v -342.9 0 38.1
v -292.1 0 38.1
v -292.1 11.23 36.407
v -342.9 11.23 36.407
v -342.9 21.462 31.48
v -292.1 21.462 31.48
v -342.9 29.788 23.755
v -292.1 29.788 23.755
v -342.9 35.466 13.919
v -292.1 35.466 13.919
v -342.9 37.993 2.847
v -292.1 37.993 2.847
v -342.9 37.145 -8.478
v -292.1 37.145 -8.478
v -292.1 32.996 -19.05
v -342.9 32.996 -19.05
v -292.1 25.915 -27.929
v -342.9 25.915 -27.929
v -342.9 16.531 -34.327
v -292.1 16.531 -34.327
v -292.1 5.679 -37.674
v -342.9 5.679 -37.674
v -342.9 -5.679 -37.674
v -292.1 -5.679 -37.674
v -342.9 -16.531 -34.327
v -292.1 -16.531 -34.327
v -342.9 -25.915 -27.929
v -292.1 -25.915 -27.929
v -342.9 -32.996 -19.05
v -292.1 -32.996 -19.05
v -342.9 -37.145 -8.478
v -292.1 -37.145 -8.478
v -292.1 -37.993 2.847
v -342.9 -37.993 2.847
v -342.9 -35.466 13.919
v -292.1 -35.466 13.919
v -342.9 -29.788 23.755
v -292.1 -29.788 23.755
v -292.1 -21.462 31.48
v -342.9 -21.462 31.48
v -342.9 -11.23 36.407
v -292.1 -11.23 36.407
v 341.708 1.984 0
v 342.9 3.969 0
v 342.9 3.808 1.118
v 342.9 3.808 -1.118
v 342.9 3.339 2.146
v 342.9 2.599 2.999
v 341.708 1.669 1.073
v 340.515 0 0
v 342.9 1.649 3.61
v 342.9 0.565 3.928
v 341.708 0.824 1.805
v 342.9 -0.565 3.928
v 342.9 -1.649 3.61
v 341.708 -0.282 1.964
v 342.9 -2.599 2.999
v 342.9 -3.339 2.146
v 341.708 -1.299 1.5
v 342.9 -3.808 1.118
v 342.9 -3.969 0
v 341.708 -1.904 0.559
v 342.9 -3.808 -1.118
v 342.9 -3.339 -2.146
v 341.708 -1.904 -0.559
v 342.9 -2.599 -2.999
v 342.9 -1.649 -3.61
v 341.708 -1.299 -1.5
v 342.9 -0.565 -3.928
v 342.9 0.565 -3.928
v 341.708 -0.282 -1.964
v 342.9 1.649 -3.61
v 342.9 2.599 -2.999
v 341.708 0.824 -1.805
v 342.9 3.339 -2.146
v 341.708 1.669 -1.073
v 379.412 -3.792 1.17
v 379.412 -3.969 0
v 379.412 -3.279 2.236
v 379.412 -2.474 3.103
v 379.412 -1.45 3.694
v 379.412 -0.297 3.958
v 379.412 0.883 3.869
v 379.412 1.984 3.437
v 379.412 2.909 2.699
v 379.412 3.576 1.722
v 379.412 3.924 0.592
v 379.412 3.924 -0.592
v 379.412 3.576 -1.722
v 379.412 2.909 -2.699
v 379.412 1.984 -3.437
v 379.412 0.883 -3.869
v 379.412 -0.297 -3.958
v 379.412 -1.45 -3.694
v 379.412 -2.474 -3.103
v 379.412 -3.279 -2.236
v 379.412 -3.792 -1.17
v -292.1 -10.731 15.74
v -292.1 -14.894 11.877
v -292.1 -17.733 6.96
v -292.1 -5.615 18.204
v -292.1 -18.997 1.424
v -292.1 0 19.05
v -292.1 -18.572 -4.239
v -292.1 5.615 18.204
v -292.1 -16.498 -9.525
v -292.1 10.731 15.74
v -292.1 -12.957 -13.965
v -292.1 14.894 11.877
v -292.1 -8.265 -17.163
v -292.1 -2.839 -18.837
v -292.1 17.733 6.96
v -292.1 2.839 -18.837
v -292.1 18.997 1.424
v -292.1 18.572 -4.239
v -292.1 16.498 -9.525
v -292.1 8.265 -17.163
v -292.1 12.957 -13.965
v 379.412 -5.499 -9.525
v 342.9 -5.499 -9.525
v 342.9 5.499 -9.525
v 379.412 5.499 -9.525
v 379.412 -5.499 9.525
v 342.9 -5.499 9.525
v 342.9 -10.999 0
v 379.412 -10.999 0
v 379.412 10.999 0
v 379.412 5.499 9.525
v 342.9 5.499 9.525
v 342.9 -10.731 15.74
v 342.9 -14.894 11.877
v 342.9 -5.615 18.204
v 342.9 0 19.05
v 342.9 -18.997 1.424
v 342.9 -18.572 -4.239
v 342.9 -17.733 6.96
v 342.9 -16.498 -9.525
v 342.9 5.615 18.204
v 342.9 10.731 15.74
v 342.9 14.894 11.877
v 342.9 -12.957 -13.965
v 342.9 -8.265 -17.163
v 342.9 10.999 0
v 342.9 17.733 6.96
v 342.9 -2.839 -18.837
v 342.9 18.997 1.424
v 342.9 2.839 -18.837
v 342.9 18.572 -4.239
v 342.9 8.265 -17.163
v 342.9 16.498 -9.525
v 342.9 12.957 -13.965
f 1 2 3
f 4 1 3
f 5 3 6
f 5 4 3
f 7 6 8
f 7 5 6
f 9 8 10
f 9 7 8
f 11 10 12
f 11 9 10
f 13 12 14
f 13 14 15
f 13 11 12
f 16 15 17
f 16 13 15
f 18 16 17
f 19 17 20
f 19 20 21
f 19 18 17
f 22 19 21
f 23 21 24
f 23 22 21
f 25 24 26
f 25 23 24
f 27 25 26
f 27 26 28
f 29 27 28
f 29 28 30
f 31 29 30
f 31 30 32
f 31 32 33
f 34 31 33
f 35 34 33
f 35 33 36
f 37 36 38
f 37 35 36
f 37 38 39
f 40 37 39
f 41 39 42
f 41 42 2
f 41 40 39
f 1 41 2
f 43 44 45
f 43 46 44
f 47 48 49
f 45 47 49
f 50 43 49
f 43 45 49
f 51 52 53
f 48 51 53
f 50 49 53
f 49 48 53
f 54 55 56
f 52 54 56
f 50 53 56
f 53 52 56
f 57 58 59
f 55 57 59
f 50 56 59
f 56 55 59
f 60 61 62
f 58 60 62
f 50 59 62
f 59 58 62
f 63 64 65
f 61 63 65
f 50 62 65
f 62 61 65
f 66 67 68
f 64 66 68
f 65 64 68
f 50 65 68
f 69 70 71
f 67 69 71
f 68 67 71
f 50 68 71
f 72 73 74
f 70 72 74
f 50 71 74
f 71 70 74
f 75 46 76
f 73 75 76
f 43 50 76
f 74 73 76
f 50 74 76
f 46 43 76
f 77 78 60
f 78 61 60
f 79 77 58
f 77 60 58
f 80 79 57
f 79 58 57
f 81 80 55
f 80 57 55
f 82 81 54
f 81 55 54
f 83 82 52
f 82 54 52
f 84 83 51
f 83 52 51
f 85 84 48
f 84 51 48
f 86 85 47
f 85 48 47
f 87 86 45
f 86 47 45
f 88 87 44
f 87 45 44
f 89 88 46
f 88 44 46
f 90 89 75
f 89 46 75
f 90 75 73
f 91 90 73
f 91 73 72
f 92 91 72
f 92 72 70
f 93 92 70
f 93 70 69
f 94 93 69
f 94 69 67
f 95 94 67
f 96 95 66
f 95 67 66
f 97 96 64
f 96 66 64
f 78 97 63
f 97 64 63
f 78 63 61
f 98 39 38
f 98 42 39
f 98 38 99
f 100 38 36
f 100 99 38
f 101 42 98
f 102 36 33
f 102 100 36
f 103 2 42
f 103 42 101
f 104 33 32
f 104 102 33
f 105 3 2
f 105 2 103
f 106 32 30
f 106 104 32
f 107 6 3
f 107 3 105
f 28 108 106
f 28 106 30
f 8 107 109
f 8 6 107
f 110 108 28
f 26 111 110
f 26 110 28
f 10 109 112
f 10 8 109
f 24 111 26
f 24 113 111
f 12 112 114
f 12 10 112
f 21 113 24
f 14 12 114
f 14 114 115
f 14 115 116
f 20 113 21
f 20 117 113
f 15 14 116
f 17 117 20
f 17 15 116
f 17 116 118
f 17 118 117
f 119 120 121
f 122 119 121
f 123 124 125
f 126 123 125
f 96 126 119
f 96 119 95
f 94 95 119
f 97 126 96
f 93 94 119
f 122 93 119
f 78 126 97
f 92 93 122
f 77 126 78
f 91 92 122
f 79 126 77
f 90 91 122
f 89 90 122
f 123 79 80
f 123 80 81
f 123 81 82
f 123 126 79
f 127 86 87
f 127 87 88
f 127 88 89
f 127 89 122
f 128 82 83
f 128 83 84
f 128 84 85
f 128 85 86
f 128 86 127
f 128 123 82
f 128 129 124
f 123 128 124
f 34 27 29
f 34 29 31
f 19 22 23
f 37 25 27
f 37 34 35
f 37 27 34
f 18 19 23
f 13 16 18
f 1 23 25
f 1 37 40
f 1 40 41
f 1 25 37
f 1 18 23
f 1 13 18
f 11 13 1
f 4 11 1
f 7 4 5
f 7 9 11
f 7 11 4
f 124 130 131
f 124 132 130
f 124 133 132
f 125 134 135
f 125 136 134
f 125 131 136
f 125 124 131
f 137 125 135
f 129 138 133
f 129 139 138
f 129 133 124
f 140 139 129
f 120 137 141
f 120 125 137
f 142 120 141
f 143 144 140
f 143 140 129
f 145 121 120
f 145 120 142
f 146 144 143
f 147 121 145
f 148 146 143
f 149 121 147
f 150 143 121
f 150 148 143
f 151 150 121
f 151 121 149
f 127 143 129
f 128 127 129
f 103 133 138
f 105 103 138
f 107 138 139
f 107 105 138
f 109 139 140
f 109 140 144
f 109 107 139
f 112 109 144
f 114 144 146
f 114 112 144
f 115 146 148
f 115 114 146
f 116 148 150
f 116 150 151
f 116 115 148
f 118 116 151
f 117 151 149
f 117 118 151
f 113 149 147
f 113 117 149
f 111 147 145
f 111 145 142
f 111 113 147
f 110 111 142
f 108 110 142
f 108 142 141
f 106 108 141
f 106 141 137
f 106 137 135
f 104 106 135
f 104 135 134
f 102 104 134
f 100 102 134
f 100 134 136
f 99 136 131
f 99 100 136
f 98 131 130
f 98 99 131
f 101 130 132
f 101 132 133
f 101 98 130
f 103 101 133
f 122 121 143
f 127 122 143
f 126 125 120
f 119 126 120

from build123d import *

# Parameters (mm, degrees)
F3_DEPTH = 36.5125
F5_D     = 7.9375
F5_DEPTH = 36.5125
F5_TIP   = 2.3846655818


with BuildPart() as f1:
    # F0 (on Front) → F1 (revolve)
    with BuildSketch(Plane.XZ):
        Polygon((-342.9, 38.1), (-342.9, 0), (342.9, 0), (342.9, 19.05), (-292.1, 19.05), (-292.1, 38.1), align=None)
    revolve(axis=Axis((0, 0, 0), (-1, 0, 0)))

    # F2 (on face) → F3 (join)
    with BuildSketch(Plane.YZ.offset(342.9)):
        Polygon((5.499261314, 9.525), (-5.499261314, 9.525), (-10.9985226281, 0), (-5.499261314, -9.525), (5.499261314, -9.525), (10.9985226281, 0), align=None)
    extrude(amount=F3_DEPTH)

    # F5
    with Locations(Plane.YZ.offset(379.4125)):
        with Locations((0, 0)):
            Hole(F5_D / 2, depth=F5_DEPTH)
            with Locations((0, 0, -(F5_DEPTH + F5_TIP / 2))):  # 118° drill point
                Cone(0, F5_D / 2, F5_TIP, mode=Mode.SUBTRACT)


solid = f1.part
